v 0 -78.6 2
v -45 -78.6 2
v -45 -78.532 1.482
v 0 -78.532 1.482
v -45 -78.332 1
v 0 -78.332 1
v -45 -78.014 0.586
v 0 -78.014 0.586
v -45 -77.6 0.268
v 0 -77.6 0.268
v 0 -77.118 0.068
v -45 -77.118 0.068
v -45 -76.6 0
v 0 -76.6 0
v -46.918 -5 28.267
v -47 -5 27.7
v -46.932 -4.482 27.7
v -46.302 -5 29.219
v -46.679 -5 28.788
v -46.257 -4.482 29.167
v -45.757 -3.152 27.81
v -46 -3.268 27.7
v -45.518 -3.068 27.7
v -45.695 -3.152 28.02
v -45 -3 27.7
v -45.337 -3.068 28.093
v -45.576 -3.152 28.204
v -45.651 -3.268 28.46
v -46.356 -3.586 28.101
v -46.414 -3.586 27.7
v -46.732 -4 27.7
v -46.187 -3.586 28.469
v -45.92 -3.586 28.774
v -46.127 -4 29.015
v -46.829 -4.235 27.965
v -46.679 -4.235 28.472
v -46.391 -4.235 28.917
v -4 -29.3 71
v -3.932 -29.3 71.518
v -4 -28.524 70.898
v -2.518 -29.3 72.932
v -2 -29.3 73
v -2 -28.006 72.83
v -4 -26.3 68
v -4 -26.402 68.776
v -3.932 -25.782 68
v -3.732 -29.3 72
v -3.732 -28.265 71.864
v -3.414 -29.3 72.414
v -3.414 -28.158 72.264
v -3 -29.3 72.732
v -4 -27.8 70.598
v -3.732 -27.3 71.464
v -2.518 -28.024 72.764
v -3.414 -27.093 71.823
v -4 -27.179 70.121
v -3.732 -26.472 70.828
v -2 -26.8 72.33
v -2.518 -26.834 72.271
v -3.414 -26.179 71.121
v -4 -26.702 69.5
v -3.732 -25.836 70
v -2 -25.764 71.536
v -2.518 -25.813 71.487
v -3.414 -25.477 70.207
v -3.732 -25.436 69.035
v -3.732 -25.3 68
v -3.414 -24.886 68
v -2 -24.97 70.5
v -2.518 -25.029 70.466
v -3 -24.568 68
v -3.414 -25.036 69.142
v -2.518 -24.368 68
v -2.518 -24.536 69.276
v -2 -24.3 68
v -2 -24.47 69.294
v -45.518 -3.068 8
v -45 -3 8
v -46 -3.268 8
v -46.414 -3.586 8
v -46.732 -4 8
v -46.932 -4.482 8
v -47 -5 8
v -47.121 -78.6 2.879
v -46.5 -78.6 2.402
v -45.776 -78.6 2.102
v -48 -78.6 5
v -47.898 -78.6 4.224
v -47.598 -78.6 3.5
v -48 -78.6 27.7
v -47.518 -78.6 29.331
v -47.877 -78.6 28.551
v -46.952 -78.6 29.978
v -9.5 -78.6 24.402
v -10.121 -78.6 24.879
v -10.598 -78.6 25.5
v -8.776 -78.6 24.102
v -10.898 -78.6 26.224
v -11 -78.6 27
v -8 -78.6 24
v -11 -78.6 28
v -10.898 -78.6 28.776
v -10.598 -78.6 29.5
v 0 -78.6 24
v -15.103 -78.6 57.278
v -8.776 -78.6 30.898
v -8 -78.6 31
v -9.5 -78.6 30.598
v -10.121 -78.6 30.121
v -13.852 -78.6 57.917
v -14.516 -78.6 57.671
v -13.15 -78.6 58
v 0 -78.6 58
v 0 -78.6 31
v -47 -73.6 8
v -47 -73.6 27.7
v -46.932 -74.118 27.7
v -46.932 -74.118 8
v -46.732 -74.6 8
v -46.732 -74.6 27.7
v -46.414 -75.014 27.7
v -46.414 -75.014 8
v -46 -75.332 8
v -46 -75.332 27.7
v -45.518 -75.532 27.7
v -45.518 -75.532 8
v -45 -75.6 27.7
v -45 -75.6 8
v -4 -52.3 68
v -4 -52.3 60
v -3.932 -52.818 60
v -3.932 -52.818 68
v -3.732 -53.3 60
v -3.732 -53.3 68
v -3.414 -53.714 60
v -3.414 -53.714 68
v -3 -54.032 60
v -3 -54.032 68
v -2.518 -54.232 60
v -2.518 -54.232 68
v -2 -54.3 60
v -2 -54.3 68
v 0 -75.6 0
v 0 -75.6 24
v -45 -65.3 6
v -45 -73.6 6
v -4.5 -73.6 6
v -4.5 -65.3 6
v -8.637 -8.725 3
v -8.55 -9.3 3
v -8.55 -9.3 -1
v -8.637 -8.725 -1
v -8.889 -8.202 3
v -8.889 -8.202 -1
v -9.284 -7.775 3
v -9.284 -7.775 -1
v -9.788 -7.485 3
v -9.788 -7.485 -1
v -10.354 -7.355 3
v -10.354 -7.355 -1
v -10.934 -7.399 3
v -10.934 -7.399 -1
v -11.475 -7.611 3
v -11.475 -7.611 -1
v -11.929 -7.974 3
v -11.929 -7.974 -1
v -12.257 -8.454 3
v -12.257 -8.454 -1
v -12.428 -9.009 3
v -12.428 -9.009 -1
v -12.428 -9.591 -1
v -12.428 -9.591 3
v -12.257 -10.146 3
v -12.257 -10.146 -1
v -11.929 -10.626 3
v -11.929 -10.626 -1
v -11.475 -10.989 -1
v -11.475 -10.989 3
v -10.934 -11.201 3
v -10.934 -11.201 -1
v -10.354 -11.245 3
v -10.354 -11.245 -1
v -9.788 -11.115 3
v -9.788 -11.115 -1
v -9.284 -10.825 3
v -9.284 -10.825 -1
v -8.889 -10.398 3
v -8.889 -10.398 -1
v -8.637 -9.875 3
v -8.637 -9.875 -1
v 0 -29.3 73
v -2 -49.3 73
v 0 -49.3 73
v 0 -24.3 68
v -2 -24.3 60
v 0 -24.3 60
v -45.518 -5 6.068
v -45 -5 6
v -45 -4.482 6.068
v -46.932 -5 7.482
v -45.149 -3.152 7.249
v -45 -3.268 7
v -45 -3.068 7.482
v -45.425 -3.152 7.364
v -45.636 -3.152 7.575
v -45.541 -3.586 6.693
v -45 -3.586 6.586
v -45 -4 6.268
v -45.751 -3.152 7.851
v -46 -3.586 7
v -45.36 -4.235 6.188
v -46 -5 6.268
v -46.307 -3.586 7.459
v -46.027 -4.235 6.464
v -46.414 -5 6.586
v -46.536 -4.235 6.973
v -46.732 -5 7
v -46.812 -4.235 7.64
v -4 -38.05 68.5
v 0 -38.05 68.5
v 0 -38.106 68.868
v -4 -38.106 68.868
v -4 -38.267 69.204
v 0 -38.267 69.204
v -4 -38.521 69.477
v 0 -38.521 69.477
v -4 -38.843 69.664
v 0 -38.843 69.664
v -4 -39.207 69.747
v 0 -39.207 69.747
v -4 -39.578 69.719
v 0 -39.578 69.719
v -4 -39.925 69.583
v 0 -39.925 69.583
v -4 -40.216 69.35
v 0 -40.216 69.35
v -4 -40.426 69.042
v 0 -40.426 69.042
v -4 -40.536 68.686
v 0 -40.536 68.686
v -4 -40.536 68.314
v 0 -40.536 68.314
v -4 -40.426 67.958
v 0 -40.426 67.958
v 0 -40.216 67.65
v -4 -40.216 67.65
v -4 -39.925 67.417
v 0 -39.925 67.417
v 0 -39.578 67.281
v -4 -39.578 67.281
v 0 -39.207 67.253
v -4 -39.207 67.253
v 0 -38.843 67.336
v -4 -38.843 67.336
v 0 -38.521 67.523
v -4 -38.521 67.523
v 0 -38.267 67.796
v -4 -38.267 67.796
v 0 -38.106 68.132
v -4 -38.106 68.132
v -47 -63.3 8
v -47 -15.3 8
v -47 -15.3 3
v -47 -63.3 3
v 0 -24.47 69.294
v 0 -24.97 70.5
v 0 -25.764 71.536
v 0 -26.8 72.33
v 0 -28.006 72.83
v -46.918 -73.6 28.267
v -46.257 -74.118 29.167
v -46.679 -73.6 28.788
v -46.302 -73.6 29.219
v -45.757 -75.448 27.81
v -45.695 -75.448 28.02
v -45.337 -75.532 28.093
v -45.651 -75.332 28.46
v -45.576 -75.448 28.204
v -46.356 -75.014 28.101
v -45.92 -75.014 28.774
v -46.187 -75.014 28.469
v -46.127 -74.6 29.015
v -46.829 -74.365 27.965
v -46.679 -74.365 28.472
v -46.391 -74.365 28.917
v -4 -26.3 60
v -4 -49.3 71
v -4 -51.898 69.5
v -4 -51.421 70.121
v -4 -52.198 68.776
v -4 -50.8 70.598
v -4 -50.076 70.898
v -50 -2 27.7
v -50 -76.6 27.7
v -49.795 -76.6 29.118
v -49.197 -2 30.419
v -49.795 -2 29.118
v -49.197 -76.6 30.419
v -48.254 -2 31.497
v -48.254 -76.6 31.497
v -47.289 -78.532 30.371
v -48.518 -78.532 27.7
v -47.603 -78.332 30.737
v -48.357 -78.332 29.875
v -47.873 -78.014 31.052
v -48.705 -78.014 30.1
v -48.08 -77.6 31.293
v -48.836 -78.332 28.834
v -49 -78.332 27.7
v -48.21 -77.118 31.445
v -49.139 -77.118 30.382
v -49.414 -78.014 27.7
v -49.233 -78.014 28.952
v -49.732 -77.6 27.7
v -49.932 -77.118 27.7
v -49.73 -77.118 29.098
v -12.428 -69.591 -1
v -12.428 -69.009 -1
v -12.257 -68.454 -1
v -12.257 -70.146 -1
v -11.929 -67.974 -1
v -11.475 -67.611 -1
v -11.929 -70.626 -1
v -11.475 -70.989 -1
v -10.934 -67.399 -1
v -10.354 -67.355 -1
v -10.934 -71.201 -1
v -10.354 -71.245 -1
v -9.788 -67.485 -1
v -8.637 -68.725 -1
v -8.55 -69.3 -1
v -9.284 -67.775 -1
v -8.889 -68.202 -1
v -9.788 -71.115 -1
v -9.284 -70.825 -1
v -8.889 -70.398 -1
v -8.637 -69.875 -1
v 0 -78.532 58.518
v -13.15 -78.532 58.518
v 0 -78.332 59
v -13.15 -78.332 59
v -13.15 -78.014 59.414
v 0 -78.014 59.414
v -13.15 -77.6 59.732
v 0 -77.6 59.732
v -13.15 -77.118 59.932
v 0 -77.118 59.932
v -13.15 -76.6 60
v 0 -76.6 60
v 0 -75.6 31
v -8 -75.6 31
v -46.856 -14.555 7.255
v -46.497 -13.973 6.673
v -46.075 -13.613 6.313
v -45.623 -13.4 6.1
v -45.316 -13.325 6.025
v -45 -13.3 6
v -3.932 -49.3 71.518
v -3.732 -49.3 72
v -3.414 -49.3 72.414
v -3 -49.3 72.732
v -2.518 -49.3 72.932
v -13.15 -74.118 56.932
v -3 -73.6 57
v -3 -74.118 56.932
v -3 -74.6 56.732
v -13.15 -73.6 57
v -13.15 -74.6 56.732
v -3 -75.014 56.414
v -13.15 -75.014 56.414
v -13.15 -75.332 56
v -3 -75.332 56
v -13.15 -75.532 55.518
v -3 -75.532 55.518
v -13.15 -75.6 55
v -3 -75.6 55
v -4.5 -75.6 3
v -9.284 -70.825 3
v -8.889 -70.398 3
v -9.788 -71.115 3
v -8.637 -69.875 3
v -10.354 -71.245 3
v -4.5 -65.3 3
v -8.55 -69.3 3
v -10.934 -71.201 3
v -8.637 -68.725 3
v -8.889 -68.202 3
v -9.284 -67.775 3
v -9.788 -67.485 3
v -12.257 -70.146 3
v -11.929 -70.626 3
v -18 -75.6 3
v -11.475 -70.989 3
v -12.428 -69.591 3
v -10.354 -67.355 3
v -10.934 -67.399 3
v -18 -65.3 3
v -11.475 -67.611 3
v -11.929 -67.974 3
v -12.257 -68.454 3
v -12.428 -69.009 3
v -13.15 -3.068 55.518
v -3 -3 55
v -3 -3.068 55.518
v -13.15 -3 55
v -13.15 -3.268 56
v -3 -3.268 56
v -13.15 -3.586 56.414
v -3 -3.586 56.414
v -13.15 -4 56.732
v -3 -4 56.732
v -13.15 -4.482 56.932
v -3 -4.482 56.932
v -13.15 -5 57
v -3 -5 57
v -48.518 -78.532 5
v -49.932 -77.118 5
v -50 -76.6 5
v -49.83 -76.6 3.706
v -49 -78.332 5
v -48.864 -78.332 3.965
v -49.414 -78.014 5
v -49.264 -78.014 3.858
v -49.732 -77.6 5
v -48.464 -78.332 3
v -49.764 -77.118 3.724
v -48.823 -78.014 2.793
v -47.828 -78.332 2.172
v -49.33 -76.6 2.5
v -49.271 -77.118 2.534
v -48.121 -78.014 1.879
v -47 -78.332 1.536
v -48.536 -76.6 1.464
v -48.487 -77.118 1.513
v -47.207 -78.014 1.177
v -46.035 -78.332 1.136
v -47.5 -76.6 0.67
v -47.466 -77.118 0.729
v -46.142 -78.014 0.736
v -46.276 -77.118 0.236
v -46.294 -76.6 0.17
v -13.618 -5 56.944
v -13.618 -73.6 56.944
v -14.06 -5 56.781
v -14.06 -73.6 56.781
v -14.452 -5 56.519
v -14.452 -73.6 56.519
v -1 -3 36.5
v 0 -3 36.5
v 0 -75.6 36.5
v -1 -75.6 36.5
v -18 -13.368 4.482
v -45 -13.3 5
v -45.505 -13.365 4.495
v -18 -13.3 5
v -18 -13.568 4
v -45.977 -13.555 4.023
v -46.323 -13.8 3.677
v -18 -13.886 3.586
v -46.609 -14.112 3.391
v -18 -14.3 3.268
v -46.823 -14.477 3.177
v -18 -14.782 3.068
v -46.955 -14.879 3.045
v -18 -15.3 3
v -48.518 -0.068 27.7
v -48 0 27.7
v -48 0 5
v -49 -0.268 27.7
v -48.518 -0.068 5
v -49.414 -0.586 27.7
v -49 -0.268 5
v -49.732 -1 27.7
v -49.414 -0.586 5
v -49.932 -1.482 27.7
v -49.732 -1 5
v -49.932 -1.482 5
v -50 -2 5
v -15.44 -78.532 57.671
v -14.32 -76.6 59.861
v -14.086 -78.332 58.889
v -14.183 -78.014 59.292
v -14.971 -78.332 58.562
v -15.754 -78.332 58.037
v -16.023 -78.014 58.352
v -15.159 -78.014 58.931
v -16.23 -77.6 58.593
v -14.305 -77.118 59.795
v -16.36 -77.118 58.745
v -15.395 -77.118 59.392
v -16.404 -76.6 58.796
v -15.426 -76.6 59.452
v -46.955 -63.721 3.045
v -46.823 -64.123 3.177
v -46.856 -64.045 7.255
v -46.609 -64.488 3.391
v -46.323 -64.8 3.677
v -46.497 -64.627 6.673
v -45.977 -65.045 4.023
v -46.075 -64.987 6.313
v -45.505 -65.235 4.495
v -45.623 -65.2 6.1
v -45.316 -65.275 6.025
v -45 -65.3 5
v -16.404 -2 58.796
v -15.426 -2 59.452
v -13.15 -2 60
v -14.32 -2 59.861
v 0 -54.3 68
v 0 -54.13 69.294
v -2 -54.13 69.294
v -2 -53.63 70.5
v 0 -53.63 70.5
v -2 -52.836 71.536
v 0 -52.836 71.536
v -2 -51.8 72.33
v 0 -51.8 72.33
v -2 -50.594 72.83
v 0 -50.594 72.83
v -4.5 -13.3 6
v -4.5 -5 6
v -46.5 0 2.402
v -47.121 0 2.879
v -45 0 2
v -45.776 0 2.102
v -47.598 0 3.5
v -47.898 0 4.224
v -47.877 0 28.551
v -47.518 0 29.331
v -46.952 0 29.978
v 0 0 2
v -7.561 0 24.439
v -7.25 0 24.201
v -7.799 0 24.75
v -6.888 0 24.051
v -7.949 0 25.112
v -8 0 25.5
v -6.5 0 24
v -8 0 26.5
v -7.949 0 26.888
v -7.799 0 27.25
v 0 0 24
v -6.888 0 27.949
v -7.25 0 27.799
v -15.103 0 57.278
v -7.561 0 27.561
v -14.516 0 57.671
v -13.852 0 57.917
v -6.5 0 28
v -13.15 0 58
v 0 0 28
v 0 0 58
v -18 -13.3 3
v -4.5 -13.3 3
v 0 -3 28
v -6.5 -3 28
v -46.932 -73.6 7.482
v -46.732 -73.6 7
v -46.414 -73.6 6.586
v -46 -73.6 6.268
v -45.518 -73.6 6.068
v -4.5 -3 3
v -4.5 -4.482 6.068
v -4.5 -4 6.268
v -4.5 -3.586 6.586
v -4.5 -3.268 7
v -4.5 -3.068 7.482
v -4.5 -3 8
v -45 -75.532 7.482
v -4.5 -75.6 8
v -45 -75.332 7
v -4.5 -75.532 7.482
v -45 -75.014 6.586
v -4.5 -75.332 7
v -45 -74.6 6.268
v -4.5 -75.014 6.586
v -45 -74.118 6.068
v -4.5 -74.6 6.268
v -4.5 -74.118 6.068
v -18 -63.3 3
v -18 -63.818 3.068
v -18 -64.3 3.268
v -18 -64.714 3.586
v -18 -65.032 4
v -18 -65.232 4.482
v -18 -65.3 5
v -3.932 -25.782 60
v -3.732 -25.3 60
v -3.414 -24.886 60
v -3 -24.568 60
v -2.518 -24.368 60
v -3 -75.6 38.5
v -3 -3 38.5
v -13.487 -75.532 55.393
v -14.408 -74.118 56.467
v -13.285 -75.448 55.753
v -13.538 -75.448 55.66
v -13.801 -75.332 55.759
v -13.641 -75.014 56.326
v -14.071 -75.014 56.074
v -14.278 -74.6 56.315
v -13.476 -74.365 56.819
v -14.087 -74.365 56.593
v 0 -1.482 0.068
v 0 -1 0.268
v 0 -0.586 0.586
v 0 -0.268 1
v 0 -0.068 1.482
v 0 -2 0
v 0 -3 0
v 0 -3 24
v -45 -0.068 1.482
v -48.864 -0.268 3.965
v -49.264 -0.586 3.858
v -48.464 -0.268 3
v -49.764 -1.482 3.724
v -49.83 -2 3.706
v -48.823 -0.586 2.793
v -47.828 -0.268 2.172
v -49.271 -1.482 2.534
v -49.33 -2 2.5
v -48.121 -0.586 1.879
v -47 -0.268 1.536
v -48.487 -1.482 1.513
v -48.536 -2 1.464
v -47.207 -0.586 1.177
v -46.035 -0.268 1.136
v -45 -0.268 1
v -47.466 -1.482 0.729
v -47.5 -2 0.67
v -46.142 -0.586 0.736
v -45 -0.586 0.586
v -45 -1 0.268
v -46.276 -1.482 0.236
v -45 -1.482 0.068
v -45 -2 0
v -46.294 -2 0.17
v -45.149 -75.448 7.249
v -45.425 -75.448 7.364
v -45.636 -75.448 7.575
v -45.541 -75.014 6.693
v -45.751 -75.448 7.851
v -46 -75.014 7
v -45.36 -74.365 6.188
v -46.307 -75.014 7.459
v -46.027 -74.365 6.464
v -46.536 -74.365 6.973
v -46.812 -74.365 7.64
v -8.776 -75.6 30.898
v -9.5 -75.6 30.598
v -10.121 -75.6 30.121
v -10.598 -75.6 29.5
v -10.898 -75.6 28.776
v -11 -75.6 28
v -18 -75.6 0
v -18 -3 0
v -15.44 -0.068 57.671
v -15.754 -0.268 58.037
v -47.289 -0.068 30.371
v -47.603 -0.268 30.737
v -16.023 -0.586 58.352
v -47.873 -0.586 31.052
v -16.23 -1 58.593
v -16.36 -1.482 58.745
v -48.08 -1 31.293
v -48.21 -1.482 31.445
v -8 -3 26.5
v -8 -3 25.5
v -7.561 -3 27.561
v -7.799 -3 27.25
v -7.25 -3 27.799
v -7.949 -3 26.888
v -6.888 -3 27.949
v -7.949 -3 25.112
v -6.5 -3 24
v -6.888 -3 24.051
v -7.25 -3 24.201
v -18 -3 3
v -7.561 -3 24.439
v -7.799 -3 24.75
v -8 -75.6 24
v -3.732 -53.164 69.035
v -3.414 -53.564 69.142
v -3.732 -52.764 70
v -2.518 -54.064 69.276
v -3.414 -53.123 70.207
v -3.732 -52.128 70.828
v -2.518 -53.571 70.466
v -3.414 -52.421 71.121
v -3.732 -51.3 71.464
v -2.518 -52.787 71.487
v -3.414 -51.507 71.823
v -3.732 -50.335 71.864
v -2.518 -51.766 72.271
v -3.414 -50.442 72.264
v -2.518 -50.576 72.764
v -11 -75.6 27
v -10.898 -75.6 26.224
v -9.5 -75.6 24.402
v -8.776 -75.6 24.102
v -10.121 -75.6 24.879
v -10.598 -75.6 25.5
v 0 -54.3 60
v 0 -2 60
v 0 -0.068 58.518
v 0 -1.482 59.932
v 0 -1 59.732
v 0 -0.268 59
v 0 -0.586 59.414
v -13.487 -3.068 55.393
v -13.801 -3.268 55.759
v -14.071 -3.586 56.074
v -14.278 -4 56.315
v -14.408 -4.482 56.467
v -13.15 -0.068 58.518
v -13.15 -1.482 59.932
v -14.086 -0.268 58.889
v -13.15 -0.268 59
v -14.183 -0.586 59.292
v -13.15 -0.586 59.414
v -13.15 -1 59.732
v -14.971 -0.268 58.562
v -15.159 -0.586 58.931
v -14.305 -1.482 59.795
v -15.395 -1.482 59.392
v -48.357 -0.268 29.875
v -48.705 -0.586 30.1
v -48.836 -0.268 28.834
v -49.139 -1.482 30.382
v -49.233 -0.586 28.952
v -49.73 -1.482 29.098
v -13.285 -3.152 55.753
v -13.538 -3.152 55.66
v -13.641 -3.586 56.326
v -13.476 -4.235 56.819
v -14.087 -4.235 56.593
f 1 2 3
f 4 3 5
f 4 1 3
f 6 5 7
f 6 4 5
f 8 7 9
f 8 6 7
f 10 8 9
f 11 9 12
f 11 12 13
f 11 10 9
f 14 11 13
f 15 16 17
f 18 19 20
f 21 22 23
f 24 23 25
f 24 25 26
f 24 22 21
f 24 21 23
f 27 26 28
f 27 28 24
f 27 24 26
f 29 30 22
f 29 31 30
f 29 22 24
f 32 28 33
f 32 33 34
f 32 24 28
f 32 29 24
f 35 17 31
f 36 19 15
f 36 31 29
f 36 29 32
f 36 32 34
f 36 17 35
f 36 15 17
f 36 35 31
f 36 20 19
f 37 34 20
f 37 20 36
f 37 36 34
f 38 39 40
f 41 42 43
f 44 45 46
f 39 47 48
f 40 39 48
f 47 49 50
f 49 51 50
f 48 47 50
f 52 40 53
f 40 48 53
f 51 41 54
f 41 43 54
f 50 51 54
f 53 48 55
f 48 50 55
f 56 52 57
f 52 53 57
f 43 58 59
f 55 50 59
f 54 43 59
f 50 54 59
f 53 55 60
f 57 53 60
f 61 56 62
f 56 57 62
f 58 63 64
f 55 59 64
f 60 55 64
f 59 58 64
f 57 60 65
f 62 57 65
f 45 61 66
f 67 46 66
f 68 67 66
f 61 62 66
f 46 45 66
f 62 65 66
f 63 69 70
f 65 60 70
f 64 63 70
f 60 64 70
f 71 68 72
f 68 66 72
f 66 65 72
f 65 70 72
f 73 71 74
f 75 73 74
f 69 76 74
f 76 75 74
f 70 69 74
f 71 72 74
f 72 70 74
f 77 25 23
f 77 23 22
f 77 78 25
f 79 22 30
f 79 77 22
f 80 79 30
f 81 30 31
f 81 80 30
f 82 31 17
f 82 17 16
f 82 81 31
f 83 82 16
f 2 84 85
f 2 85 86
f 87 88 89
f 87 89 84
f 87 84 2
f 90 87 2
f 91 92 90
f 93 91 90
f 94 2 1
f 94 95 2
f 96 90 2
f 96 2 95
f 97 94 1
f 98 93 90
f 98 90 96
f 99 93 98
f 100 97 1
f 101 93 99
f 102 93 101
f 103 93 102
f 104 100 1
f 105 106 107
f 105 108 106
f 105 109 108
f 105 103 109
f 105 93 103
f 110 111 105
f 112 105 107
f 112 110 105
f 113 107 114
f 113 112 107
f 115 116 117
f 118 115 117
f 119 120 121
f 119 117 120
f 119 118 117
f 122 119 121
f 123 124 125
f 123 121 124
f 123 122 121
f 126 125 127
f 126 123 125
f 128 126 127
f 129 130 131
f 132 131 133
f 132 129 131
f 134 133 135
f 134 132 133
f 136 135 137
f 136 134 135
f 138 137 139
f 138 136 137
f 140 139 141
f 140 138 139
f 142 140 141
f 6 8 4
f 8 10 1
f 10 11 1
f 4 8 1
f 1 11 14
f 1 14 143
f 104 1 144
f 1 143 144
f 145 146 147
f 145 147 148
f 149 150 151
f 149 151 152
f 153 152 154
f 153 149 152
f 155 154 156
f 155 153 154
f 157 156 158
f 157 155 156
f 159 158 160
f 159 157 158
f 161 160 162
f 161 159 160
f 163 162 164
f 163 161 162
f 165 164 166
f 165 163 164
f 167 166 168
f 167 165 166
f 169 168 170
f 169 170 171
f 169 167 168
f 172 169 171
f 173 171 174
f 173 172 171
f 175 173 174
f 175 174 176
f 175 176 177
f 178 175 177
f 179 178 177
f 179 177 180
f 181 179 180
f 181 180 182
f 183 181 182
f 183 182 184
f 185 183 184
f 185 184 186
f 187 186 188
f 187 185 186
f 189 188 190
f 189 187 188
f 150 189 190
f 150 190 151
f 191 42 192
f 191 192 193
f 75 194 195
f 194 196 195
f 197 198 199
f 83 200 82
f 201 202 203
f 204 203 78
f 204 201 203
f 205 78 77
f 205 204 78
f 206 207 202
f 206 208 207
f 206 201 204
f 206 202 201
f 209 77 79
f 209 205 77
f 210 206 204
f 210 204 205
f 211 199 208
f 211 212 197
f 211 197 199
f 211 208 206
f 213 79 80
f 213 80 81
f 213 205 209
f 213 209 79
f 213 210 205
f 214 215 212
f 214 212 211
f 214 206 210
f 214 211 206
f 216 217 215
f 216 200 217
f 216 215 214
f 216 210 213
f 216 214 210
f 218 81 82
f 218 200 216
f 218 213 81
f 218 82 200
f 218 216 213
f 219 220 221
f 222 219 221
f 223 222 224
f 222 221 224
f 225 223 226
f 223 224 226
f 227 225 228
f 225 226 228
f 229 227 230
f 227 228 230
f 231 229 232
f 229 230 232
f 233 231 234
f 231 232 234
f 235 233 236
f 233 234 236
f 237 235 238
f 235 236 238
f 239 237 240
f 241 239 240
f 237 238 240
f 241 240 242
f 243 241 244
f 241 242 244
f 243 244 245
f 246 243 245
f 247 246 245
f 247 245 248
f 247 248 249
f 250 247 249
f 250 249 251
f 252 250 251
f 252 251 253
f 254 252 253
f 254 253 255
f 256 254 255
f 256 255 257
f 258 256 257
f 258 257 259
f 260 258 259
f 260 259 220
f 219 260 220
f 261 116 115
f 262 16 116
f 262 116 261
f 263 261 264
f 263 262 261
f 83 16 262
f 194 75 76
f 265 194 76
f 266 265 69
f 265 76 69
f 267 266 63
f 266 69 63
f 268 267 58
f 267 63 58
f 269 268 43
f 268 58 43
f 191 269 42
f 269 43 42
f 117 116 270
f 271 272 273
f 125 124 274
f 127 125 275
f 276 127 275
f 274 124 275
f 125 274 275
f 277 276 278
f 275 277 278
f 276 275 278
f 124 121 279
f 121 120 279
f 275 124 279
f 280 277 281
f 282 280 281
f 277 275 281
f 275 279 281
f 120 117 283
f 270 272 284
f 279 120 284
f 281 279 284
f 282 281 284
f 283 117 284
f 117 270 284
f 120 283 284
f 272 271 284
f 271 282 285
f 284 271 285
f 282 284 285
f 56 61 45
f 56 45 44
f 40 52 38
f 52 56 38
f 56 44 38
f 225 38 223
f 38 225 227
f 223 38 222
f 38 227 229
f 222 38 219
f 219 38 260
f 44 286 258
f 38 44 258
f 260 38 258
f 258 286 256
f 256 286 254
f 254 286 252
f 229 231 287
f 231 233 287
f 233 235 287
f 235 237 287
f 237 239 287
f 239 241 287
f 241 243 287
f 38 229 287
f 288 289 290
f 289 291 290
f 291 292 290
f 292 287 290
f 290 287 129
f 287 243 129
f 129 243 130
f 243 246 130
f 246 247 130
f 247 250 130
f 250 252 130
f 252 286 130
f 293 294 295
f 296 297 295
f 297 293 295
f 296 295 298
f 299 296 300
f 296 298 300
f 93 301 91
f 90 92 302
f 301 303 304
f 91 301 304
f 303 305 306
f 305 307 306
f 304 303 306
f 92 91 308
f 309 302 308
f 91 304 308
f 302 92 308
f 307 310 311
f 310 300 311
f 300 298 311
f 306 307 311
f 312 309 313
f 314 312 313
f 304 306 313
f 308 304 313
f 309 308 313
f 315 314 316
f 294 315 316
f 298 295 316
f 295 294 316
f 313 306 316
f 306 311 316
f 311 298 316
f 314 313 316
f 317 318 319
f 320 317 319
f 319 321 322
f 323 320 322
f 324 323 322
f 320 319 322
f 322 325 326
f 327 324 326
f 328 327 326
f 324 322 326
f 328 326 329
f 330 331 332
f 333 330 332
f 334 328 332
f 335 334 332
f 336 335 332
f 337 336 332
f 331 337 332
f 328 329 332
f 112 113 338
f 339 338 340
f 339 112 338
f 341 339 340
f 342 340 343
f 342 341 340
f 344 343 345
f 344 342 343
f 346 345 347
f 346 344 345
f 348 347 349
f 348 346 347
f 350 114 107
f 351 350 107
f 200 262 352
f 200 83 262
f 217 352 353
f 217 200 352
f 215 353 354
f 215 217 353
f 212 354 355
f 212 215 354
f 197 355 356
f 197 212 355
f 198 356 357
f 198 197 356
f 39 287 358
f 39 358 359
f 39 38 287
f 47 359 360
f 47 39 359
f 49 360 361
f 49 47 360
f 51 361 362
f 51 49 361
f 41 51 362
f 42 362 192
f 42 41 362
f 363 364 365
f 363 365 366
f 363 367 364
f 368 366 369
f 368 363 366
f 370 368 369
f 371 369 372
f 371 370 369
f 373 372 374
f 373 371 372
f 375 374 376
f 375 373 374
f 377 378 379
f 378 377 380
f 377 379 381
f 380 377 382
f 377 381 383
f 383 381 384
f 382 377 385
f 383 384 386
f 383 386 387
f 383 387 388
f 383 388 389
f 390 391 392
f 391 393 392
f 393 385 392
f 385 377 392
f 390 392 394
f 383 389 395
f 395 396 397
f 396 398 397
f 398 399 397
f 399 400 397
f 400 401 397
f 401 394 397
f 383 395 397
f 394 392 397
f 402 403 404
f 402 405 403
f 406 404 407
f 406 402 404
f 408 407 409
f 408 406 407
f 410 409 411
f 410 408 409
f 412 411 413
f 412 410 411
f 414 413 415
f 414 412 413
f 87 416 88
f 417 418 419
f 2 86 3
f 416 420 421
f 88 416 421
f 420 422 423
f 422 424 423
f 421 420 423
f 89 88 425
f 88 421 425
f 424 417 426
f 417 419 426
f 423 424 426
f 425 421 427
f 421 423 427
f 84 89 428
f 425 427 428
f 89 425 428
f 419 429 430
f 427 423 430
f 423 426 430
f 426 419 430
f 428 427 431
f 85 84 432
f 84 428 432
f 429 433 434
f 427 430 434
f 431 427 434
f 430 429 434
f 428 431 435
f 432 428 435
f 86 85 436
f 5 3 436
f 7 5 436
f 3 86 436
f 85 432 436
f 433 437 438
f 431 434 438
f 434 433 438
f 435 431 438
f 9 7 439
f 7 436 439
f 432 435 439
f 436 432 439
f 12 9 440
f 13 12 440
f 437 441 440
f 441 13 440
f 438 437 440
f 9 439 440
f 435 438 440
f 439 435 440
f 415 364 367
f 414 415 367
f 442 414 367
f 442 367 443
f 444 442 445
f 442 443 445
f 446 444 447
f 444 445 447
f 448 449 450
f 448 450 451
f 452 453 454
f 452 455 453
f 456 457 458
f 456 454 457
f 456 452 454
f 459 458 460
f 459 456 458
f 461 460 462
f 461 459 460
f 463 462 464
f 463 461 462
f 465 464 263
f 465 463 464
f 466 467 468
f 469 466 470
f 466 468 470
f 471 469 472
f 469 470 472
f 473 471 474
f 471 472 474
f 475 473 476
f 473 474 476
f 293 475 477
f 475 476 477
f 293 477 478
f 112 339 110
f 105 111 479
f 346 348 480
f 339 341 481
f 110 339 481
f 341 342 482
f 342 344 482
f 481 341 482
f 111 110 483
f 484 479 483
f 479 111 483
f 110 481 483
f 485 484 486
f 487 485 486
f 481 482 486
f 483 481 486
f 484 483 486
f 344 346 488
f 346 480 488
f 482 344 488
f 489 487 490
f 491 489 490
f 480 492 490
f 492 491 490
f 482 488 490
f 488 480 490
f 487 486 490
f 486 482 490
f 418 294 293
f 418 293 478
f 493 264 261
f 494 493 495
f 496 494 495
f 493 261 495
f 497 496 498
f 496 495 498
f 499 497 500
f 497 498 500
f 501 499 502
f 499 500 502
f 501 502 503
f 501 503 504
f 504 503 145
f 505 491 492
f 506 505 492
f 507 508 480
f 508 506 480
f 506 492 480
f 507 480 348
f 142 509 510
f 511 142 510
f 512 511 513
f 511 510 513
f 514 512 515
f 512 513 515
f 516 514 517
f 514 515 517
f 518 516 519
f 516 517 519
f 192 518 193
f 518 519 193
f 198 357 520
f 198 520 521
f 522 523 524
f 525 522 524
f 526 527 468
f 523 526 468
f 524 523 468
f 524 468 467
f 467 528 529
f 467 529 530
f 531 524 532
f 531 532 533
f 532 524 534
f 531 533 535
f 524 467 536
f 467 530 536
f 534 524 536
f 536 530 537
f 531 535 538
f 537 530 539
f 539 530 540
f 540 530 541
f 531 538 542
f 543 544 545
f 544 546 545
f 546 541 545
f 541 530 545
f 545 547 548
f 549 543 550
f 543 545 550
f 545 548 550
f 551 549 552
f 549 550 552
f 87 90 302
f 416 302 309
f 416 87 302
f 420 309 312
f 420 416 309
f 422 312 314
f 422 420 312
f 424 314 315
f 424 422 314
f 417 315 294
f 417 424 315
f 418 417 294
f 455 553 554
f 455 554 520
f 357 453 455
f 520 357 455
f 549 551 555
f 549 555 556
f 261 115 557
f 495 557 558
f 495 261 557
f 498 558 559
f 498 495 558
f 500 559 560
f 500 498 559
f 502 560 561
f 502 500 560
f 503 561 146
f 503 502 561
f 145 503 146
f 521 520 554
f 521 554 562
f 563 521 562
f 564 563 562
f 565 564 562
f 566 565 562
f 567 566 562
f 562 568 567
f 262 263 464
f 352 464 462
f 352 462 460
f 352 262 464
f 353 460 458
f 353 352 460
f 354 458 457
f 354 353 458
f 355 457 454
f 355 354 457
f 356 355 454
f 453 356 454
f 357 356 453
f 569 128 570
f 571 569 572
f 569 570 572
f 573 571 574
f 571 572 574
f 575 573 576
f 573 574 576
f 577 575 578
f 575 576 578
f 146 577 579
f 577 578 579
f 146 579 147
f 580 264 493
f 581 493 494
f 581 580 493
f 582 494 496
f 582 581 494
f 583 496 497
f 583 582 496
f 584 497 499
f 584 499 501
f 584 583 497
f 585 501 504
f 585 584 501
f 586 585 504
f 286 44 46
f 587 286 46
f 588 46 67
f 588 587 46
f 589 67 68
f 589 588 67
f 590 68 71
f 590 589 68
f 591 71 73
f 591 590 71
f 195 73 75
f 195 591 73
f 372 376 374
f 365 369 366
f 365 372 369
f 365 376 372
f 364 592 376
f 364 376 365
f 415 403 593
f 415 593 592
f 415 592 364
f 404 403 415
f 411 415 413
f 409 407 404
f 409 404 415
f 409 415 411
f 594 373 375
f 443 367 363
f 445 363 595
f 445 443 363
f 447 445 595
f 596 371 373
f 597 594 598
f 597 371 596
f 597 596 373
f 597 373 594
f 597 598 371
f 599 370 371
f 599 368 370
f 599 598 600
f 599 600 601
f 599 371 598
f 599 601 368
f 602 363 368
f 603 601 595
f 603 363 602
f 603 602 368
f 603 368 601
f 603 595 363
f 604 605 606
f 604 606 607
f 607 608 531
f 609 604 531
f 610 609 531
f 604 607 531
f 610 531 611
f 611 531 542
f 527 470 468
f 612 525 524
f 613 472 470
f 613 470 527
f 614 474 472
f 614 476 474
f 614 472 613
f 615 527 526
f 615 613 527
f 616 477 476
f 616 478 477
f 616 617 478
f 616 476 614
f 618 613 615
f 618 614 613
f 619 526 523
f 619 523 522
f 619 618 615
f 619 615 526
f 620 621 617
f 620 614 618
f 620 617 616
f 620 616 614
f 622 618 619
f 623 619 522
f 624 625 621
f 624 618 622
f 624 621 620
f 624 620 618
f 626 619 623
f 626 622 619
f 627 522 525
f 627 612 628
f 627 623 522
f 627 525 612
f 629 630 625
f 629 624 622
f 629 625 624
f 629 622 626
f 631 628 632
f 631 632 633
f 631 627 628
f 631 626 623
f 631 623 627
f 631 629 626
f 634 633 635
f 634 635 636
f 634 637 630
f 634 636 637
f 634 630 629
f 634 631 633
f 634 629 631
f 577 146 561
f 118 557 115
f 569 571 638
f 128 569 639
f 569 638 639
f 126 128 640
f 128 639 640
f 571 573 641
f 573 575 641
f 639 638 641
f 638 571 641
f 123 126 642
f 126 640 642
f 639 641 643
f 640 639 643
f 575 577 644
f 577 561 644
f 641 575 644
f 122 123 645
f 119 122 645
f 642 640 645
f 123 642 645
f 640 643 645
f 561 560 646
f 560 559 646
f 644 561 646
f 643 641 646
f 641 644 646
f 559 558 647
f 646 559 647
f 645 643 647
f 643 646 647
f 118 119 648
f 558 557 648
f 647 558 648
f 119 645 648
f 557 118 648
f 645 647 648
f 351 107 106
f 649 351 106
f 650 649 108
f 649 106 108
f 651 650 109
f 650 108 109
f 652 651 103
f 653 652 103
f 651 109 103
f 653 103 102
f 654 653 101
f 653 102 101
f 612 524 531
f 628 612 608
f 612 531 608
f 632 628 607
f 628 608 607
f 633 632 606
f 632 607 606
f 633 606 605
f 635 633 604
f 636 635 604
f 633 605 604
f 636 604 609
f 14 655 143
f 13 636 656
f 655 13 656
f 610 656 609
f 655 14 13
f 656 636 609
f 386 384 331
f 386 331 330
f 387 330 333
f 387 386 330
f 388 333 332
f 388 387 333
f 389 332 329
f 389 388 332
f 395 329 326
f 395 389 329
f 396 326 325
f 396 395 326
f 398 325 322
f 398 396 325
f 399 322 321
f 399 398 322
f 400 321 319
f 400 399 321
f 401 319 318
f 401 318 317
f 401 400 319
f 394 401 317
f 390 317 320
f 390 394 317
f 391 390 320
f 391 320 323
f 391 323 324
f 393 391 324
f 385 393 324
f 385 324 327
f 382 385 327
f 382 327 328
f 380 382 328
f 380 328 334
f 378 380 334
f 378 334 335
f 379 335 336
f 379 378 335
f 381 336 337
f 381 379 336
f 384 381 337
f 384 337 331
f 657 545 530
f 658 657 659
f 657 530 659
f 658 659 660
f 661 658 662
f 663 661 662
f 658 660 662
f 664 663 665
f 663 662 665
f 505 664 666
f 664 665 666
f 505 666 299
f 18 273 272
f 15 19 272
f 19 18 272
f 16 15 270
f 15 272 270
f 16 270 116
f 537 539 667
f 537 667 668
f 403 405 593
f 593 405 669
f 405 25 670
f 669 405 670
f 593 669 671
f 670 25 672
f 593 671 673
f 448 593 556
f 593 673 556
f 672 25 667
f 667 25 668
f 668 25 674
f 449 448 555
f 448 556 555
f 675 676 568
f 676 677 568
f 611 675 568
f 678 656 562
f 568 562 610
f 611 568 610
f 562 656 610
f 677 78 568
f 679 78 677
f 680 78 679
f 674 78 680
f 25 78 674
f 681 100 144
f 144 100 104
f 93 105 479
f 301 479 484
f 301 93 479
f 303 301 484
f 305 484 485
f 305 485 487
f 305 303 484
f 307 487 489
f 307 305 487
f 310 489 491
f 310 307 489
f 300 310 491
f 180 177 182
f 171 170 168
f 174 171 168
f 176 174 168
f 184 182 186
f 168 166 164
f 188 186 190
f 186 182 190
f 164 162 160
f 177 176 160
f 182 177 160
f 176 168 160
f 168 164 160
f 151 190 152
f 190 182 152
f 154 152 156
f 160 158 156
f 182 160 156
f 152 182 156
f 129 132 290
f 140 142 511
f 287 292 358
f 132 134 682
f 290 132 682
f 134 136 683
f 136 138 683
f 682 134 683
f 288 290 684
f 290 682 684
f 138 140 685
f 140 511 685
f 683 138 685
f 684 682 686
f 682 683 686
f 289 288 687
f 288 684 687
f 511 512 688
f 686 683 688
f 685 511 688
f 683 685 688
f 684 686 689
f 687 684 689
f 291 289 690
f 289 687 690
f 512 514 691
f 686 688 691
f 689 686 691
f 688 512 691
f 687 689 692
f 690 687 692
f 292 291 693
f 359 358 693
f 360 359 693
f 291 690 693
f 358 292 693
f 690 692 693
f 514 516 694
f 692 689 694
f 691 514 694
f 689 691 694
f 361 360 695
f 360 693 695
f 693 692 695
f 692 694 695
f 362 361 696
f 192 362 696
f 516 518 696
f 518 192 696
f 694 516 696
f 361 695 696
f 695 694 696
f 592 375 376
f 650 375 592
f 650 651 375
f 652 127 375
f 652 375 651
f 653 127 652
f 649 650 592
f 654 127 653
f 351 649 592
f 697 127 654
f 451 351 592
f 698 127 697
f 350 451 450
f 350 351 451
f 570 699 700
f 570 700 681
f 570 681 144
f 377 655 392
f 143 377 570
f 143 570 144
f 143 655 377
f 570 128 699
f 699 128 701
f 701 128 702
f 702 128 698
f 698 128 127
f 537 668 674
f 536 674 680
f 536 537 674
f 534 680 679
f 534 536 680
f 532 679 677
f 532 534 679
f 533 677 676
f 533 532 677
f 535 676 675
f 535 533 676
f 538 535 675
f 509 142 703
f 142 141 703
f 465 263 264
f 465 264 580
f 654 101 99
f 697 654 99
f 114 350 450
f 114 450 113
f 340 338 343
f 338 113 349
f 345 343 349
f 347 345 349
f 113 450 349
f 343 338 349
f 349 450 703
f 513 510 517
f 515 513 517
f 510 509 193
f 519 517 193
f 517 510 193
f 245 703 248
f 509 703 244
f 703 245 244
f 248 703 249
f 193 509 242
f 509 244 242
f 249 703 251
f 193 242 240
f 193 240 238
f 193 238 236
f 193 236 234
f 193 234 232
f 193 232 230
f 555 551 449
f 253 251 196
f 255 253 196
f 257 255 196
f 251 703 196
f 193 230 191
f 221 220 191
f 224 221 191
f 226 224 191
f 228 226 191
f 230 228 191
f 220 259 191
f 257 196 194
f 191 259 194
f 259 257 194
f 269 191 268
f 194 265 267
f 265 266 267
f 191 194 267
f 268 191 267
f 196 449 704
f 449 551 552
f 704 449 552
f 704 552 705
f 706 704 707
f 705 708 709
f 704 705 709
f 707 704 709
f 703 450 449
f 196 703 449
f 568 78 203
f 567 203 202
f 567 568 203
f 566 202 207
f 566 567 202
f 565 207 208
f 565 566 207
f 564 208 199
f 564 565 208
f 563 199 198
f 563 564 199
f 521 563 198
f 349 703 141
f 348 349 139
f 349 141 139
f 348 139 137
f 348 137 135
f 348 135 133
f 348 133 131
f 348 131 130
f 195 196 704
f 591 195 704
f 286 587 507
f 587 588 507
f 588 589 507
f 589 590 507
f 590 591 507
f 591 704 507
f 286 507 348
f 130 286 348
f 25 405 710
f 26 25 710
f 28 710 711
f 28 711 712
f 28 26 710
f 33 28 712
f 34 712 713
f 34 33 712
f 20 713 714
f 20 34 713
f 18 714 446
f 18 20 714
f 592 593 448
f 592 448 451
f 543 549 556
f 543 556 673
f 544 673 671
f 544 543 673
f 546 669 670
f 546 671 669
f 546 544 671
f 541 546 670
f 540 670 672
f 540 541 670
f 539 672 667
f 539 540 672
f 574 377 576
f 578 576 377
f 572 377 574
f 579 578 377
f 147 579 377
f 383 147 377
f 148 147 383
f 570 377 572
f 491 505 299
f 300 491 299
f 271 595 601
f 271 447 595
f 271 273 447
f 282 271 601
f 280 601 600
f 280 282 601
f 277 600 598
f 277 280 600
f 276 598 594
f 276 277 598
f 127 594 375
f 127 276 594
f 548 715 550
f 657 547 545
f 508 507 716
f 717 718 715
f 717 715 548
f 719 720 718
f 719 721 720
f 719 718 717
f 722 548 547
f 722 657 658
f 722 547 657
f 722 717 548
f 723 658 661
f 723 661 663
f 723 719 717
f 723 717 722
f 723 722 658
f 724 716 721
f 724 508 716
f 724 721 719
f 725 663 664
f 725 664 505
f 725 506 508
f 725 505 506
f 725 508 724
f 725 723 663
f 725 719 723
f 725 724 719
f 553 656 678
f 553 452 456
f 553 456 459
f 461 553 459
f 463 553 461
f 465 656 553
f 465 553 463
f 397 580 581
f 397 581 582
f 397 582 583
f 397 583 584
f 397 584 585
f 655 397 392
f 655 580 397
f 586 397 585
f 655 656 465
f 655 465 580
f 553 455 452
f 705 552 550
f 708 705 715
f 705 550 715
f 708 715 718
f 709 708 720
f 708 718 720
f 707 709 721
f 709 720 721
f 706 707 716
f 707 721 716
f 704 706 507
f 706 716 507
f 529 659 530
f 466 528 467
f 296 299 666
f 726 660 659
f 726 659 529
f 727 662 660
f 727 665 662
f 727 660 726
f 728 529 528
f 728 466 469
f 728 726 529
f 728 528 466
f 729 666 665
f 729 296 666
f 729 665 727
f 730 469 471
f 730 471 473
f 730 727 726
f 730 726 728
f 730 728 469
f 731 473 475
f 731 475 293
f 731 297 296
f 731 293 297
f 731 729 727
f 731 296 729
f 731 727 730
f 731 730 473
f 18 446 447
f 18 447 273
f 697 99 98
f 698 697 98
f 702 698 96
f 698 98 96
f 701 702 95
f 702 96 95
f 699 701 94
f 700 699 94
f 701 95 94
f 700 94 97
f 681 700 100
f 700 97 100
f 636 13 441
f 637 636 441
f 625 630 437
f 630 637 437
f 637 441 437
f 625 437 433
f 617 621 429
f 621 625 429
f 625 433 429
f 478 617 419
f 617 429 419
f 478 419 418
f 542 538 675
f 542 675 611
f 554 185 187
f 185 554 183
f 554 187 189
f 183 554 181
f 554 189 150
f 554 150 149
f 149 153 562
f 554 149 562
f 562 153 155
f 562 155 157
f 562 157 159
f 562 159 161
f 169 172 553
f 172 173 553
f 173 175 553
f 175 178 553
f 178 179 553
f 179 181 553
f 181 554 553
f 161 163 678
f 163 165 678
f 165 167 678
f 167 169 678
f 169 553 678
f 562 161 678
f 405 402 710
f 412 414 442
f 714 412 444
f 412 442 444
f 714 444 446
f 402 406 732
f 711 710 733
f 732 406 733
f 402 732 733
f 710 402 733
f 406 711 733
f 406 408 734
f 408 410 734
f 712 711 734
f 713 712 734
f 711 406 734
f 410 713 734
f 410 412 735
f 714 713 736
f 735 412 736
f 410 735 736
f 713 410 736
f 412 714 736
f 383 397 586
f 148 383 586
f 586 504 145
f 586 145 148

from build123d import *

# Parameters (mm, degrees)
F1_DEPTH  = 78.6
F4_DEPTH  = 72.6
F5_W      = 18
F5_H      = 72.6
F6_DEPTH  = 5
F8_DEPTH  = 5
F10_DEPTH = 5
F12_DEPTH = 13
F13_R     = 5
F14_R     = 2
F15_R     = 1.25
F16_DEPTH = 25
F17_W     = 10.3
F17_H     = 3
F18_DEPTH = 42.5
F20_R     = 1.95
F21_DEPTH = 4
F22_SIZE  = 2
F23_R     = 2


with BuildPart() as f1:
    # F0 (on Front) → F1 (new body)
    with BuildSketch(Plane.XZ):
        Polygon((-50, 0), (0, 0), (0, 60), (-15, 60), (-50, 30), align=None)
    extrude(amount=F1_DEPTH)

    # F3 (on offset) → F4 (cut)
    with BuildSketch(Plane.XZ.offset(3)):
        Polygon((-47, 3), (0, 3), (0, 36.5), (-3, 36.5), (-3, 57), (-13.8902277714, 57), (-47, 28.6201952326), align=None)
    extrude(amount=F4_DEPTH, mode=Mode.SUBTRACT)

    # F5 (on face) → F6 (cut)
    with BuildSketch(Plane(origin=(0, 0, 0), x_dir=(1, 0, 0), z_dir=(0, 0, -1))):
        with Locations((-9, 39.3)):
            Rectangle(F5_W, F5_H)
    extrude(amount=-F6_DEPTH, mode=Mode.SUBTRACT)

    # F7 (on Front) → F8 (cut)
    with BuildSketch(Plane.XZ):
        with BuildLine():
            Line((-6.5, 24), (0, 24))
            Line((0, 24), (0, 28))
            Line((0, 28), (-6.5, 28))
            ThreePointArc((-6.5, 28), (-7.5606601718, 27.5606601718), (-8, 26.5))
            Line((-8, 26.5), (-8, 25.5))
            ThreePointArc((-8, 25.5), (-7.5606601718, 24.4393398282), (-6.5, 24))
        make_face()
    extrude(amount=F8_DEPTH, mode=Mode.SUBTRACT)

    # F9 (on face) → F10 (cut)
    with BuildSketch(Plane.XZ.offset(78.6)):
        with BuildLine():
            Line((-8, 24), (0, 24))
            Line((0, 24), (0, 31))
            Line((0, 31), (-8, 31))
            ThreePointArc((-8, 31), (-10.1213203436, 30.1213203436), (-11, 28))
            Line((-11, 28), (-11, 27))
            ThreePointArc((-11, 27), (-10.1213203436, 24.8786796564), (-8, 24))
        make_face()
    extrude(amount=-F10_DEPTH, mode=Mode.SUBTRACT)

    # F11 (on face) → F12 (join)
    with BuildSketch(Plane.XY.offset(60)):
        Polygon((-4, -24.3), (-4, -39.3), (-4, -54.3), (0, -54.3), (0, -39.3), (0, -24.3), align=None)
    extrude(amount=F12_DEPTH)

    # F13
    f13_edges = [f1.edges().sort_by_distance(p)[0] for p in [
        (-2, -54.3, 73),
        (-2, -24.3, 73),
        (-15, -39.3, 60),
        (-50, -39.3, 30),
        (-50, -39.3, 0),
    ]]
    fillet(f13_edges, radius=F13_R)

    # F14
    f14_edges = [f1.edges().sort_by_distance(p)[0] for p in [
        (-4, -54.3, 64),
        (-32.329147, 0, 45.146446),
        (-32.329147, -78.6, 45.146446),
    ]]
    fillet(f14_edges, radius=F14_R)

    # F15 (on face) → F16 (cut)
    with BuildSketch(Plane.YZ):
        with Locations((-39.3, 68.5)):
            Circle(F15_R)
    extrude(amount=-F16_DEPTH, mode=Mode.SUBTRACT)

    # F17 (on face) → F18 (join)
    with BuildSketch(Plane.YZ.offset(-47)):
        with Locations((-8.15, 4.5)):
            Rectangle(F17_W, F17_H)
        with Locations((-70.45, 4.5)):
            Rectangle(F17_W, F17_H)
    extrude(amount=F18_DEPTH)

    # F20 (on offset) → F21 (join)
    with BuildSketch(Plane.XY.offset(3)):
        with Locations((-10.5, -9.3)):
            Circle(F20_R)
        with Locations((-10.5, -69.3)):
            Circle(F20_R)
    extrude(amount=-F21_DEPTH)

    # F22
    f22_edges = [f1.edges().sort_by_distance(p)[0] for p in [
        (-3, -39.3, 36.5),
    ]]
    chamfer(f22_edges, length=F22_SIZE)

    # F23
    f23_edges = [f1.edges().sort_by_distance(p)[0] for p in [
        (-47, -8.15, 6),
        (-47, -13.3, 4.5),
        (-32.5, -13.3, 3),
        (-47, -70.45, 6),
        (-47, -65.3, 4.5),
        (-32.5, -65.3, 3),
        (-25.75, -75.6, 6),
        (-25.75, -3, 6),
        (-47, -3, 17.310098),
        (-30.445114, -3, 42.810098),
        (-47, -39.3, 28.620195),
        (-47, -75.6, 17.310098),
        (-30.445114, -75.6, 42.810098),
        (-13.890228, -39.3, 57),
        (-8.445114, -3, 57),
        (-8.445114, -75.6, 57),
    ]]
    fillet(f23_edges, radius=F23_R)


solid = f1.part
